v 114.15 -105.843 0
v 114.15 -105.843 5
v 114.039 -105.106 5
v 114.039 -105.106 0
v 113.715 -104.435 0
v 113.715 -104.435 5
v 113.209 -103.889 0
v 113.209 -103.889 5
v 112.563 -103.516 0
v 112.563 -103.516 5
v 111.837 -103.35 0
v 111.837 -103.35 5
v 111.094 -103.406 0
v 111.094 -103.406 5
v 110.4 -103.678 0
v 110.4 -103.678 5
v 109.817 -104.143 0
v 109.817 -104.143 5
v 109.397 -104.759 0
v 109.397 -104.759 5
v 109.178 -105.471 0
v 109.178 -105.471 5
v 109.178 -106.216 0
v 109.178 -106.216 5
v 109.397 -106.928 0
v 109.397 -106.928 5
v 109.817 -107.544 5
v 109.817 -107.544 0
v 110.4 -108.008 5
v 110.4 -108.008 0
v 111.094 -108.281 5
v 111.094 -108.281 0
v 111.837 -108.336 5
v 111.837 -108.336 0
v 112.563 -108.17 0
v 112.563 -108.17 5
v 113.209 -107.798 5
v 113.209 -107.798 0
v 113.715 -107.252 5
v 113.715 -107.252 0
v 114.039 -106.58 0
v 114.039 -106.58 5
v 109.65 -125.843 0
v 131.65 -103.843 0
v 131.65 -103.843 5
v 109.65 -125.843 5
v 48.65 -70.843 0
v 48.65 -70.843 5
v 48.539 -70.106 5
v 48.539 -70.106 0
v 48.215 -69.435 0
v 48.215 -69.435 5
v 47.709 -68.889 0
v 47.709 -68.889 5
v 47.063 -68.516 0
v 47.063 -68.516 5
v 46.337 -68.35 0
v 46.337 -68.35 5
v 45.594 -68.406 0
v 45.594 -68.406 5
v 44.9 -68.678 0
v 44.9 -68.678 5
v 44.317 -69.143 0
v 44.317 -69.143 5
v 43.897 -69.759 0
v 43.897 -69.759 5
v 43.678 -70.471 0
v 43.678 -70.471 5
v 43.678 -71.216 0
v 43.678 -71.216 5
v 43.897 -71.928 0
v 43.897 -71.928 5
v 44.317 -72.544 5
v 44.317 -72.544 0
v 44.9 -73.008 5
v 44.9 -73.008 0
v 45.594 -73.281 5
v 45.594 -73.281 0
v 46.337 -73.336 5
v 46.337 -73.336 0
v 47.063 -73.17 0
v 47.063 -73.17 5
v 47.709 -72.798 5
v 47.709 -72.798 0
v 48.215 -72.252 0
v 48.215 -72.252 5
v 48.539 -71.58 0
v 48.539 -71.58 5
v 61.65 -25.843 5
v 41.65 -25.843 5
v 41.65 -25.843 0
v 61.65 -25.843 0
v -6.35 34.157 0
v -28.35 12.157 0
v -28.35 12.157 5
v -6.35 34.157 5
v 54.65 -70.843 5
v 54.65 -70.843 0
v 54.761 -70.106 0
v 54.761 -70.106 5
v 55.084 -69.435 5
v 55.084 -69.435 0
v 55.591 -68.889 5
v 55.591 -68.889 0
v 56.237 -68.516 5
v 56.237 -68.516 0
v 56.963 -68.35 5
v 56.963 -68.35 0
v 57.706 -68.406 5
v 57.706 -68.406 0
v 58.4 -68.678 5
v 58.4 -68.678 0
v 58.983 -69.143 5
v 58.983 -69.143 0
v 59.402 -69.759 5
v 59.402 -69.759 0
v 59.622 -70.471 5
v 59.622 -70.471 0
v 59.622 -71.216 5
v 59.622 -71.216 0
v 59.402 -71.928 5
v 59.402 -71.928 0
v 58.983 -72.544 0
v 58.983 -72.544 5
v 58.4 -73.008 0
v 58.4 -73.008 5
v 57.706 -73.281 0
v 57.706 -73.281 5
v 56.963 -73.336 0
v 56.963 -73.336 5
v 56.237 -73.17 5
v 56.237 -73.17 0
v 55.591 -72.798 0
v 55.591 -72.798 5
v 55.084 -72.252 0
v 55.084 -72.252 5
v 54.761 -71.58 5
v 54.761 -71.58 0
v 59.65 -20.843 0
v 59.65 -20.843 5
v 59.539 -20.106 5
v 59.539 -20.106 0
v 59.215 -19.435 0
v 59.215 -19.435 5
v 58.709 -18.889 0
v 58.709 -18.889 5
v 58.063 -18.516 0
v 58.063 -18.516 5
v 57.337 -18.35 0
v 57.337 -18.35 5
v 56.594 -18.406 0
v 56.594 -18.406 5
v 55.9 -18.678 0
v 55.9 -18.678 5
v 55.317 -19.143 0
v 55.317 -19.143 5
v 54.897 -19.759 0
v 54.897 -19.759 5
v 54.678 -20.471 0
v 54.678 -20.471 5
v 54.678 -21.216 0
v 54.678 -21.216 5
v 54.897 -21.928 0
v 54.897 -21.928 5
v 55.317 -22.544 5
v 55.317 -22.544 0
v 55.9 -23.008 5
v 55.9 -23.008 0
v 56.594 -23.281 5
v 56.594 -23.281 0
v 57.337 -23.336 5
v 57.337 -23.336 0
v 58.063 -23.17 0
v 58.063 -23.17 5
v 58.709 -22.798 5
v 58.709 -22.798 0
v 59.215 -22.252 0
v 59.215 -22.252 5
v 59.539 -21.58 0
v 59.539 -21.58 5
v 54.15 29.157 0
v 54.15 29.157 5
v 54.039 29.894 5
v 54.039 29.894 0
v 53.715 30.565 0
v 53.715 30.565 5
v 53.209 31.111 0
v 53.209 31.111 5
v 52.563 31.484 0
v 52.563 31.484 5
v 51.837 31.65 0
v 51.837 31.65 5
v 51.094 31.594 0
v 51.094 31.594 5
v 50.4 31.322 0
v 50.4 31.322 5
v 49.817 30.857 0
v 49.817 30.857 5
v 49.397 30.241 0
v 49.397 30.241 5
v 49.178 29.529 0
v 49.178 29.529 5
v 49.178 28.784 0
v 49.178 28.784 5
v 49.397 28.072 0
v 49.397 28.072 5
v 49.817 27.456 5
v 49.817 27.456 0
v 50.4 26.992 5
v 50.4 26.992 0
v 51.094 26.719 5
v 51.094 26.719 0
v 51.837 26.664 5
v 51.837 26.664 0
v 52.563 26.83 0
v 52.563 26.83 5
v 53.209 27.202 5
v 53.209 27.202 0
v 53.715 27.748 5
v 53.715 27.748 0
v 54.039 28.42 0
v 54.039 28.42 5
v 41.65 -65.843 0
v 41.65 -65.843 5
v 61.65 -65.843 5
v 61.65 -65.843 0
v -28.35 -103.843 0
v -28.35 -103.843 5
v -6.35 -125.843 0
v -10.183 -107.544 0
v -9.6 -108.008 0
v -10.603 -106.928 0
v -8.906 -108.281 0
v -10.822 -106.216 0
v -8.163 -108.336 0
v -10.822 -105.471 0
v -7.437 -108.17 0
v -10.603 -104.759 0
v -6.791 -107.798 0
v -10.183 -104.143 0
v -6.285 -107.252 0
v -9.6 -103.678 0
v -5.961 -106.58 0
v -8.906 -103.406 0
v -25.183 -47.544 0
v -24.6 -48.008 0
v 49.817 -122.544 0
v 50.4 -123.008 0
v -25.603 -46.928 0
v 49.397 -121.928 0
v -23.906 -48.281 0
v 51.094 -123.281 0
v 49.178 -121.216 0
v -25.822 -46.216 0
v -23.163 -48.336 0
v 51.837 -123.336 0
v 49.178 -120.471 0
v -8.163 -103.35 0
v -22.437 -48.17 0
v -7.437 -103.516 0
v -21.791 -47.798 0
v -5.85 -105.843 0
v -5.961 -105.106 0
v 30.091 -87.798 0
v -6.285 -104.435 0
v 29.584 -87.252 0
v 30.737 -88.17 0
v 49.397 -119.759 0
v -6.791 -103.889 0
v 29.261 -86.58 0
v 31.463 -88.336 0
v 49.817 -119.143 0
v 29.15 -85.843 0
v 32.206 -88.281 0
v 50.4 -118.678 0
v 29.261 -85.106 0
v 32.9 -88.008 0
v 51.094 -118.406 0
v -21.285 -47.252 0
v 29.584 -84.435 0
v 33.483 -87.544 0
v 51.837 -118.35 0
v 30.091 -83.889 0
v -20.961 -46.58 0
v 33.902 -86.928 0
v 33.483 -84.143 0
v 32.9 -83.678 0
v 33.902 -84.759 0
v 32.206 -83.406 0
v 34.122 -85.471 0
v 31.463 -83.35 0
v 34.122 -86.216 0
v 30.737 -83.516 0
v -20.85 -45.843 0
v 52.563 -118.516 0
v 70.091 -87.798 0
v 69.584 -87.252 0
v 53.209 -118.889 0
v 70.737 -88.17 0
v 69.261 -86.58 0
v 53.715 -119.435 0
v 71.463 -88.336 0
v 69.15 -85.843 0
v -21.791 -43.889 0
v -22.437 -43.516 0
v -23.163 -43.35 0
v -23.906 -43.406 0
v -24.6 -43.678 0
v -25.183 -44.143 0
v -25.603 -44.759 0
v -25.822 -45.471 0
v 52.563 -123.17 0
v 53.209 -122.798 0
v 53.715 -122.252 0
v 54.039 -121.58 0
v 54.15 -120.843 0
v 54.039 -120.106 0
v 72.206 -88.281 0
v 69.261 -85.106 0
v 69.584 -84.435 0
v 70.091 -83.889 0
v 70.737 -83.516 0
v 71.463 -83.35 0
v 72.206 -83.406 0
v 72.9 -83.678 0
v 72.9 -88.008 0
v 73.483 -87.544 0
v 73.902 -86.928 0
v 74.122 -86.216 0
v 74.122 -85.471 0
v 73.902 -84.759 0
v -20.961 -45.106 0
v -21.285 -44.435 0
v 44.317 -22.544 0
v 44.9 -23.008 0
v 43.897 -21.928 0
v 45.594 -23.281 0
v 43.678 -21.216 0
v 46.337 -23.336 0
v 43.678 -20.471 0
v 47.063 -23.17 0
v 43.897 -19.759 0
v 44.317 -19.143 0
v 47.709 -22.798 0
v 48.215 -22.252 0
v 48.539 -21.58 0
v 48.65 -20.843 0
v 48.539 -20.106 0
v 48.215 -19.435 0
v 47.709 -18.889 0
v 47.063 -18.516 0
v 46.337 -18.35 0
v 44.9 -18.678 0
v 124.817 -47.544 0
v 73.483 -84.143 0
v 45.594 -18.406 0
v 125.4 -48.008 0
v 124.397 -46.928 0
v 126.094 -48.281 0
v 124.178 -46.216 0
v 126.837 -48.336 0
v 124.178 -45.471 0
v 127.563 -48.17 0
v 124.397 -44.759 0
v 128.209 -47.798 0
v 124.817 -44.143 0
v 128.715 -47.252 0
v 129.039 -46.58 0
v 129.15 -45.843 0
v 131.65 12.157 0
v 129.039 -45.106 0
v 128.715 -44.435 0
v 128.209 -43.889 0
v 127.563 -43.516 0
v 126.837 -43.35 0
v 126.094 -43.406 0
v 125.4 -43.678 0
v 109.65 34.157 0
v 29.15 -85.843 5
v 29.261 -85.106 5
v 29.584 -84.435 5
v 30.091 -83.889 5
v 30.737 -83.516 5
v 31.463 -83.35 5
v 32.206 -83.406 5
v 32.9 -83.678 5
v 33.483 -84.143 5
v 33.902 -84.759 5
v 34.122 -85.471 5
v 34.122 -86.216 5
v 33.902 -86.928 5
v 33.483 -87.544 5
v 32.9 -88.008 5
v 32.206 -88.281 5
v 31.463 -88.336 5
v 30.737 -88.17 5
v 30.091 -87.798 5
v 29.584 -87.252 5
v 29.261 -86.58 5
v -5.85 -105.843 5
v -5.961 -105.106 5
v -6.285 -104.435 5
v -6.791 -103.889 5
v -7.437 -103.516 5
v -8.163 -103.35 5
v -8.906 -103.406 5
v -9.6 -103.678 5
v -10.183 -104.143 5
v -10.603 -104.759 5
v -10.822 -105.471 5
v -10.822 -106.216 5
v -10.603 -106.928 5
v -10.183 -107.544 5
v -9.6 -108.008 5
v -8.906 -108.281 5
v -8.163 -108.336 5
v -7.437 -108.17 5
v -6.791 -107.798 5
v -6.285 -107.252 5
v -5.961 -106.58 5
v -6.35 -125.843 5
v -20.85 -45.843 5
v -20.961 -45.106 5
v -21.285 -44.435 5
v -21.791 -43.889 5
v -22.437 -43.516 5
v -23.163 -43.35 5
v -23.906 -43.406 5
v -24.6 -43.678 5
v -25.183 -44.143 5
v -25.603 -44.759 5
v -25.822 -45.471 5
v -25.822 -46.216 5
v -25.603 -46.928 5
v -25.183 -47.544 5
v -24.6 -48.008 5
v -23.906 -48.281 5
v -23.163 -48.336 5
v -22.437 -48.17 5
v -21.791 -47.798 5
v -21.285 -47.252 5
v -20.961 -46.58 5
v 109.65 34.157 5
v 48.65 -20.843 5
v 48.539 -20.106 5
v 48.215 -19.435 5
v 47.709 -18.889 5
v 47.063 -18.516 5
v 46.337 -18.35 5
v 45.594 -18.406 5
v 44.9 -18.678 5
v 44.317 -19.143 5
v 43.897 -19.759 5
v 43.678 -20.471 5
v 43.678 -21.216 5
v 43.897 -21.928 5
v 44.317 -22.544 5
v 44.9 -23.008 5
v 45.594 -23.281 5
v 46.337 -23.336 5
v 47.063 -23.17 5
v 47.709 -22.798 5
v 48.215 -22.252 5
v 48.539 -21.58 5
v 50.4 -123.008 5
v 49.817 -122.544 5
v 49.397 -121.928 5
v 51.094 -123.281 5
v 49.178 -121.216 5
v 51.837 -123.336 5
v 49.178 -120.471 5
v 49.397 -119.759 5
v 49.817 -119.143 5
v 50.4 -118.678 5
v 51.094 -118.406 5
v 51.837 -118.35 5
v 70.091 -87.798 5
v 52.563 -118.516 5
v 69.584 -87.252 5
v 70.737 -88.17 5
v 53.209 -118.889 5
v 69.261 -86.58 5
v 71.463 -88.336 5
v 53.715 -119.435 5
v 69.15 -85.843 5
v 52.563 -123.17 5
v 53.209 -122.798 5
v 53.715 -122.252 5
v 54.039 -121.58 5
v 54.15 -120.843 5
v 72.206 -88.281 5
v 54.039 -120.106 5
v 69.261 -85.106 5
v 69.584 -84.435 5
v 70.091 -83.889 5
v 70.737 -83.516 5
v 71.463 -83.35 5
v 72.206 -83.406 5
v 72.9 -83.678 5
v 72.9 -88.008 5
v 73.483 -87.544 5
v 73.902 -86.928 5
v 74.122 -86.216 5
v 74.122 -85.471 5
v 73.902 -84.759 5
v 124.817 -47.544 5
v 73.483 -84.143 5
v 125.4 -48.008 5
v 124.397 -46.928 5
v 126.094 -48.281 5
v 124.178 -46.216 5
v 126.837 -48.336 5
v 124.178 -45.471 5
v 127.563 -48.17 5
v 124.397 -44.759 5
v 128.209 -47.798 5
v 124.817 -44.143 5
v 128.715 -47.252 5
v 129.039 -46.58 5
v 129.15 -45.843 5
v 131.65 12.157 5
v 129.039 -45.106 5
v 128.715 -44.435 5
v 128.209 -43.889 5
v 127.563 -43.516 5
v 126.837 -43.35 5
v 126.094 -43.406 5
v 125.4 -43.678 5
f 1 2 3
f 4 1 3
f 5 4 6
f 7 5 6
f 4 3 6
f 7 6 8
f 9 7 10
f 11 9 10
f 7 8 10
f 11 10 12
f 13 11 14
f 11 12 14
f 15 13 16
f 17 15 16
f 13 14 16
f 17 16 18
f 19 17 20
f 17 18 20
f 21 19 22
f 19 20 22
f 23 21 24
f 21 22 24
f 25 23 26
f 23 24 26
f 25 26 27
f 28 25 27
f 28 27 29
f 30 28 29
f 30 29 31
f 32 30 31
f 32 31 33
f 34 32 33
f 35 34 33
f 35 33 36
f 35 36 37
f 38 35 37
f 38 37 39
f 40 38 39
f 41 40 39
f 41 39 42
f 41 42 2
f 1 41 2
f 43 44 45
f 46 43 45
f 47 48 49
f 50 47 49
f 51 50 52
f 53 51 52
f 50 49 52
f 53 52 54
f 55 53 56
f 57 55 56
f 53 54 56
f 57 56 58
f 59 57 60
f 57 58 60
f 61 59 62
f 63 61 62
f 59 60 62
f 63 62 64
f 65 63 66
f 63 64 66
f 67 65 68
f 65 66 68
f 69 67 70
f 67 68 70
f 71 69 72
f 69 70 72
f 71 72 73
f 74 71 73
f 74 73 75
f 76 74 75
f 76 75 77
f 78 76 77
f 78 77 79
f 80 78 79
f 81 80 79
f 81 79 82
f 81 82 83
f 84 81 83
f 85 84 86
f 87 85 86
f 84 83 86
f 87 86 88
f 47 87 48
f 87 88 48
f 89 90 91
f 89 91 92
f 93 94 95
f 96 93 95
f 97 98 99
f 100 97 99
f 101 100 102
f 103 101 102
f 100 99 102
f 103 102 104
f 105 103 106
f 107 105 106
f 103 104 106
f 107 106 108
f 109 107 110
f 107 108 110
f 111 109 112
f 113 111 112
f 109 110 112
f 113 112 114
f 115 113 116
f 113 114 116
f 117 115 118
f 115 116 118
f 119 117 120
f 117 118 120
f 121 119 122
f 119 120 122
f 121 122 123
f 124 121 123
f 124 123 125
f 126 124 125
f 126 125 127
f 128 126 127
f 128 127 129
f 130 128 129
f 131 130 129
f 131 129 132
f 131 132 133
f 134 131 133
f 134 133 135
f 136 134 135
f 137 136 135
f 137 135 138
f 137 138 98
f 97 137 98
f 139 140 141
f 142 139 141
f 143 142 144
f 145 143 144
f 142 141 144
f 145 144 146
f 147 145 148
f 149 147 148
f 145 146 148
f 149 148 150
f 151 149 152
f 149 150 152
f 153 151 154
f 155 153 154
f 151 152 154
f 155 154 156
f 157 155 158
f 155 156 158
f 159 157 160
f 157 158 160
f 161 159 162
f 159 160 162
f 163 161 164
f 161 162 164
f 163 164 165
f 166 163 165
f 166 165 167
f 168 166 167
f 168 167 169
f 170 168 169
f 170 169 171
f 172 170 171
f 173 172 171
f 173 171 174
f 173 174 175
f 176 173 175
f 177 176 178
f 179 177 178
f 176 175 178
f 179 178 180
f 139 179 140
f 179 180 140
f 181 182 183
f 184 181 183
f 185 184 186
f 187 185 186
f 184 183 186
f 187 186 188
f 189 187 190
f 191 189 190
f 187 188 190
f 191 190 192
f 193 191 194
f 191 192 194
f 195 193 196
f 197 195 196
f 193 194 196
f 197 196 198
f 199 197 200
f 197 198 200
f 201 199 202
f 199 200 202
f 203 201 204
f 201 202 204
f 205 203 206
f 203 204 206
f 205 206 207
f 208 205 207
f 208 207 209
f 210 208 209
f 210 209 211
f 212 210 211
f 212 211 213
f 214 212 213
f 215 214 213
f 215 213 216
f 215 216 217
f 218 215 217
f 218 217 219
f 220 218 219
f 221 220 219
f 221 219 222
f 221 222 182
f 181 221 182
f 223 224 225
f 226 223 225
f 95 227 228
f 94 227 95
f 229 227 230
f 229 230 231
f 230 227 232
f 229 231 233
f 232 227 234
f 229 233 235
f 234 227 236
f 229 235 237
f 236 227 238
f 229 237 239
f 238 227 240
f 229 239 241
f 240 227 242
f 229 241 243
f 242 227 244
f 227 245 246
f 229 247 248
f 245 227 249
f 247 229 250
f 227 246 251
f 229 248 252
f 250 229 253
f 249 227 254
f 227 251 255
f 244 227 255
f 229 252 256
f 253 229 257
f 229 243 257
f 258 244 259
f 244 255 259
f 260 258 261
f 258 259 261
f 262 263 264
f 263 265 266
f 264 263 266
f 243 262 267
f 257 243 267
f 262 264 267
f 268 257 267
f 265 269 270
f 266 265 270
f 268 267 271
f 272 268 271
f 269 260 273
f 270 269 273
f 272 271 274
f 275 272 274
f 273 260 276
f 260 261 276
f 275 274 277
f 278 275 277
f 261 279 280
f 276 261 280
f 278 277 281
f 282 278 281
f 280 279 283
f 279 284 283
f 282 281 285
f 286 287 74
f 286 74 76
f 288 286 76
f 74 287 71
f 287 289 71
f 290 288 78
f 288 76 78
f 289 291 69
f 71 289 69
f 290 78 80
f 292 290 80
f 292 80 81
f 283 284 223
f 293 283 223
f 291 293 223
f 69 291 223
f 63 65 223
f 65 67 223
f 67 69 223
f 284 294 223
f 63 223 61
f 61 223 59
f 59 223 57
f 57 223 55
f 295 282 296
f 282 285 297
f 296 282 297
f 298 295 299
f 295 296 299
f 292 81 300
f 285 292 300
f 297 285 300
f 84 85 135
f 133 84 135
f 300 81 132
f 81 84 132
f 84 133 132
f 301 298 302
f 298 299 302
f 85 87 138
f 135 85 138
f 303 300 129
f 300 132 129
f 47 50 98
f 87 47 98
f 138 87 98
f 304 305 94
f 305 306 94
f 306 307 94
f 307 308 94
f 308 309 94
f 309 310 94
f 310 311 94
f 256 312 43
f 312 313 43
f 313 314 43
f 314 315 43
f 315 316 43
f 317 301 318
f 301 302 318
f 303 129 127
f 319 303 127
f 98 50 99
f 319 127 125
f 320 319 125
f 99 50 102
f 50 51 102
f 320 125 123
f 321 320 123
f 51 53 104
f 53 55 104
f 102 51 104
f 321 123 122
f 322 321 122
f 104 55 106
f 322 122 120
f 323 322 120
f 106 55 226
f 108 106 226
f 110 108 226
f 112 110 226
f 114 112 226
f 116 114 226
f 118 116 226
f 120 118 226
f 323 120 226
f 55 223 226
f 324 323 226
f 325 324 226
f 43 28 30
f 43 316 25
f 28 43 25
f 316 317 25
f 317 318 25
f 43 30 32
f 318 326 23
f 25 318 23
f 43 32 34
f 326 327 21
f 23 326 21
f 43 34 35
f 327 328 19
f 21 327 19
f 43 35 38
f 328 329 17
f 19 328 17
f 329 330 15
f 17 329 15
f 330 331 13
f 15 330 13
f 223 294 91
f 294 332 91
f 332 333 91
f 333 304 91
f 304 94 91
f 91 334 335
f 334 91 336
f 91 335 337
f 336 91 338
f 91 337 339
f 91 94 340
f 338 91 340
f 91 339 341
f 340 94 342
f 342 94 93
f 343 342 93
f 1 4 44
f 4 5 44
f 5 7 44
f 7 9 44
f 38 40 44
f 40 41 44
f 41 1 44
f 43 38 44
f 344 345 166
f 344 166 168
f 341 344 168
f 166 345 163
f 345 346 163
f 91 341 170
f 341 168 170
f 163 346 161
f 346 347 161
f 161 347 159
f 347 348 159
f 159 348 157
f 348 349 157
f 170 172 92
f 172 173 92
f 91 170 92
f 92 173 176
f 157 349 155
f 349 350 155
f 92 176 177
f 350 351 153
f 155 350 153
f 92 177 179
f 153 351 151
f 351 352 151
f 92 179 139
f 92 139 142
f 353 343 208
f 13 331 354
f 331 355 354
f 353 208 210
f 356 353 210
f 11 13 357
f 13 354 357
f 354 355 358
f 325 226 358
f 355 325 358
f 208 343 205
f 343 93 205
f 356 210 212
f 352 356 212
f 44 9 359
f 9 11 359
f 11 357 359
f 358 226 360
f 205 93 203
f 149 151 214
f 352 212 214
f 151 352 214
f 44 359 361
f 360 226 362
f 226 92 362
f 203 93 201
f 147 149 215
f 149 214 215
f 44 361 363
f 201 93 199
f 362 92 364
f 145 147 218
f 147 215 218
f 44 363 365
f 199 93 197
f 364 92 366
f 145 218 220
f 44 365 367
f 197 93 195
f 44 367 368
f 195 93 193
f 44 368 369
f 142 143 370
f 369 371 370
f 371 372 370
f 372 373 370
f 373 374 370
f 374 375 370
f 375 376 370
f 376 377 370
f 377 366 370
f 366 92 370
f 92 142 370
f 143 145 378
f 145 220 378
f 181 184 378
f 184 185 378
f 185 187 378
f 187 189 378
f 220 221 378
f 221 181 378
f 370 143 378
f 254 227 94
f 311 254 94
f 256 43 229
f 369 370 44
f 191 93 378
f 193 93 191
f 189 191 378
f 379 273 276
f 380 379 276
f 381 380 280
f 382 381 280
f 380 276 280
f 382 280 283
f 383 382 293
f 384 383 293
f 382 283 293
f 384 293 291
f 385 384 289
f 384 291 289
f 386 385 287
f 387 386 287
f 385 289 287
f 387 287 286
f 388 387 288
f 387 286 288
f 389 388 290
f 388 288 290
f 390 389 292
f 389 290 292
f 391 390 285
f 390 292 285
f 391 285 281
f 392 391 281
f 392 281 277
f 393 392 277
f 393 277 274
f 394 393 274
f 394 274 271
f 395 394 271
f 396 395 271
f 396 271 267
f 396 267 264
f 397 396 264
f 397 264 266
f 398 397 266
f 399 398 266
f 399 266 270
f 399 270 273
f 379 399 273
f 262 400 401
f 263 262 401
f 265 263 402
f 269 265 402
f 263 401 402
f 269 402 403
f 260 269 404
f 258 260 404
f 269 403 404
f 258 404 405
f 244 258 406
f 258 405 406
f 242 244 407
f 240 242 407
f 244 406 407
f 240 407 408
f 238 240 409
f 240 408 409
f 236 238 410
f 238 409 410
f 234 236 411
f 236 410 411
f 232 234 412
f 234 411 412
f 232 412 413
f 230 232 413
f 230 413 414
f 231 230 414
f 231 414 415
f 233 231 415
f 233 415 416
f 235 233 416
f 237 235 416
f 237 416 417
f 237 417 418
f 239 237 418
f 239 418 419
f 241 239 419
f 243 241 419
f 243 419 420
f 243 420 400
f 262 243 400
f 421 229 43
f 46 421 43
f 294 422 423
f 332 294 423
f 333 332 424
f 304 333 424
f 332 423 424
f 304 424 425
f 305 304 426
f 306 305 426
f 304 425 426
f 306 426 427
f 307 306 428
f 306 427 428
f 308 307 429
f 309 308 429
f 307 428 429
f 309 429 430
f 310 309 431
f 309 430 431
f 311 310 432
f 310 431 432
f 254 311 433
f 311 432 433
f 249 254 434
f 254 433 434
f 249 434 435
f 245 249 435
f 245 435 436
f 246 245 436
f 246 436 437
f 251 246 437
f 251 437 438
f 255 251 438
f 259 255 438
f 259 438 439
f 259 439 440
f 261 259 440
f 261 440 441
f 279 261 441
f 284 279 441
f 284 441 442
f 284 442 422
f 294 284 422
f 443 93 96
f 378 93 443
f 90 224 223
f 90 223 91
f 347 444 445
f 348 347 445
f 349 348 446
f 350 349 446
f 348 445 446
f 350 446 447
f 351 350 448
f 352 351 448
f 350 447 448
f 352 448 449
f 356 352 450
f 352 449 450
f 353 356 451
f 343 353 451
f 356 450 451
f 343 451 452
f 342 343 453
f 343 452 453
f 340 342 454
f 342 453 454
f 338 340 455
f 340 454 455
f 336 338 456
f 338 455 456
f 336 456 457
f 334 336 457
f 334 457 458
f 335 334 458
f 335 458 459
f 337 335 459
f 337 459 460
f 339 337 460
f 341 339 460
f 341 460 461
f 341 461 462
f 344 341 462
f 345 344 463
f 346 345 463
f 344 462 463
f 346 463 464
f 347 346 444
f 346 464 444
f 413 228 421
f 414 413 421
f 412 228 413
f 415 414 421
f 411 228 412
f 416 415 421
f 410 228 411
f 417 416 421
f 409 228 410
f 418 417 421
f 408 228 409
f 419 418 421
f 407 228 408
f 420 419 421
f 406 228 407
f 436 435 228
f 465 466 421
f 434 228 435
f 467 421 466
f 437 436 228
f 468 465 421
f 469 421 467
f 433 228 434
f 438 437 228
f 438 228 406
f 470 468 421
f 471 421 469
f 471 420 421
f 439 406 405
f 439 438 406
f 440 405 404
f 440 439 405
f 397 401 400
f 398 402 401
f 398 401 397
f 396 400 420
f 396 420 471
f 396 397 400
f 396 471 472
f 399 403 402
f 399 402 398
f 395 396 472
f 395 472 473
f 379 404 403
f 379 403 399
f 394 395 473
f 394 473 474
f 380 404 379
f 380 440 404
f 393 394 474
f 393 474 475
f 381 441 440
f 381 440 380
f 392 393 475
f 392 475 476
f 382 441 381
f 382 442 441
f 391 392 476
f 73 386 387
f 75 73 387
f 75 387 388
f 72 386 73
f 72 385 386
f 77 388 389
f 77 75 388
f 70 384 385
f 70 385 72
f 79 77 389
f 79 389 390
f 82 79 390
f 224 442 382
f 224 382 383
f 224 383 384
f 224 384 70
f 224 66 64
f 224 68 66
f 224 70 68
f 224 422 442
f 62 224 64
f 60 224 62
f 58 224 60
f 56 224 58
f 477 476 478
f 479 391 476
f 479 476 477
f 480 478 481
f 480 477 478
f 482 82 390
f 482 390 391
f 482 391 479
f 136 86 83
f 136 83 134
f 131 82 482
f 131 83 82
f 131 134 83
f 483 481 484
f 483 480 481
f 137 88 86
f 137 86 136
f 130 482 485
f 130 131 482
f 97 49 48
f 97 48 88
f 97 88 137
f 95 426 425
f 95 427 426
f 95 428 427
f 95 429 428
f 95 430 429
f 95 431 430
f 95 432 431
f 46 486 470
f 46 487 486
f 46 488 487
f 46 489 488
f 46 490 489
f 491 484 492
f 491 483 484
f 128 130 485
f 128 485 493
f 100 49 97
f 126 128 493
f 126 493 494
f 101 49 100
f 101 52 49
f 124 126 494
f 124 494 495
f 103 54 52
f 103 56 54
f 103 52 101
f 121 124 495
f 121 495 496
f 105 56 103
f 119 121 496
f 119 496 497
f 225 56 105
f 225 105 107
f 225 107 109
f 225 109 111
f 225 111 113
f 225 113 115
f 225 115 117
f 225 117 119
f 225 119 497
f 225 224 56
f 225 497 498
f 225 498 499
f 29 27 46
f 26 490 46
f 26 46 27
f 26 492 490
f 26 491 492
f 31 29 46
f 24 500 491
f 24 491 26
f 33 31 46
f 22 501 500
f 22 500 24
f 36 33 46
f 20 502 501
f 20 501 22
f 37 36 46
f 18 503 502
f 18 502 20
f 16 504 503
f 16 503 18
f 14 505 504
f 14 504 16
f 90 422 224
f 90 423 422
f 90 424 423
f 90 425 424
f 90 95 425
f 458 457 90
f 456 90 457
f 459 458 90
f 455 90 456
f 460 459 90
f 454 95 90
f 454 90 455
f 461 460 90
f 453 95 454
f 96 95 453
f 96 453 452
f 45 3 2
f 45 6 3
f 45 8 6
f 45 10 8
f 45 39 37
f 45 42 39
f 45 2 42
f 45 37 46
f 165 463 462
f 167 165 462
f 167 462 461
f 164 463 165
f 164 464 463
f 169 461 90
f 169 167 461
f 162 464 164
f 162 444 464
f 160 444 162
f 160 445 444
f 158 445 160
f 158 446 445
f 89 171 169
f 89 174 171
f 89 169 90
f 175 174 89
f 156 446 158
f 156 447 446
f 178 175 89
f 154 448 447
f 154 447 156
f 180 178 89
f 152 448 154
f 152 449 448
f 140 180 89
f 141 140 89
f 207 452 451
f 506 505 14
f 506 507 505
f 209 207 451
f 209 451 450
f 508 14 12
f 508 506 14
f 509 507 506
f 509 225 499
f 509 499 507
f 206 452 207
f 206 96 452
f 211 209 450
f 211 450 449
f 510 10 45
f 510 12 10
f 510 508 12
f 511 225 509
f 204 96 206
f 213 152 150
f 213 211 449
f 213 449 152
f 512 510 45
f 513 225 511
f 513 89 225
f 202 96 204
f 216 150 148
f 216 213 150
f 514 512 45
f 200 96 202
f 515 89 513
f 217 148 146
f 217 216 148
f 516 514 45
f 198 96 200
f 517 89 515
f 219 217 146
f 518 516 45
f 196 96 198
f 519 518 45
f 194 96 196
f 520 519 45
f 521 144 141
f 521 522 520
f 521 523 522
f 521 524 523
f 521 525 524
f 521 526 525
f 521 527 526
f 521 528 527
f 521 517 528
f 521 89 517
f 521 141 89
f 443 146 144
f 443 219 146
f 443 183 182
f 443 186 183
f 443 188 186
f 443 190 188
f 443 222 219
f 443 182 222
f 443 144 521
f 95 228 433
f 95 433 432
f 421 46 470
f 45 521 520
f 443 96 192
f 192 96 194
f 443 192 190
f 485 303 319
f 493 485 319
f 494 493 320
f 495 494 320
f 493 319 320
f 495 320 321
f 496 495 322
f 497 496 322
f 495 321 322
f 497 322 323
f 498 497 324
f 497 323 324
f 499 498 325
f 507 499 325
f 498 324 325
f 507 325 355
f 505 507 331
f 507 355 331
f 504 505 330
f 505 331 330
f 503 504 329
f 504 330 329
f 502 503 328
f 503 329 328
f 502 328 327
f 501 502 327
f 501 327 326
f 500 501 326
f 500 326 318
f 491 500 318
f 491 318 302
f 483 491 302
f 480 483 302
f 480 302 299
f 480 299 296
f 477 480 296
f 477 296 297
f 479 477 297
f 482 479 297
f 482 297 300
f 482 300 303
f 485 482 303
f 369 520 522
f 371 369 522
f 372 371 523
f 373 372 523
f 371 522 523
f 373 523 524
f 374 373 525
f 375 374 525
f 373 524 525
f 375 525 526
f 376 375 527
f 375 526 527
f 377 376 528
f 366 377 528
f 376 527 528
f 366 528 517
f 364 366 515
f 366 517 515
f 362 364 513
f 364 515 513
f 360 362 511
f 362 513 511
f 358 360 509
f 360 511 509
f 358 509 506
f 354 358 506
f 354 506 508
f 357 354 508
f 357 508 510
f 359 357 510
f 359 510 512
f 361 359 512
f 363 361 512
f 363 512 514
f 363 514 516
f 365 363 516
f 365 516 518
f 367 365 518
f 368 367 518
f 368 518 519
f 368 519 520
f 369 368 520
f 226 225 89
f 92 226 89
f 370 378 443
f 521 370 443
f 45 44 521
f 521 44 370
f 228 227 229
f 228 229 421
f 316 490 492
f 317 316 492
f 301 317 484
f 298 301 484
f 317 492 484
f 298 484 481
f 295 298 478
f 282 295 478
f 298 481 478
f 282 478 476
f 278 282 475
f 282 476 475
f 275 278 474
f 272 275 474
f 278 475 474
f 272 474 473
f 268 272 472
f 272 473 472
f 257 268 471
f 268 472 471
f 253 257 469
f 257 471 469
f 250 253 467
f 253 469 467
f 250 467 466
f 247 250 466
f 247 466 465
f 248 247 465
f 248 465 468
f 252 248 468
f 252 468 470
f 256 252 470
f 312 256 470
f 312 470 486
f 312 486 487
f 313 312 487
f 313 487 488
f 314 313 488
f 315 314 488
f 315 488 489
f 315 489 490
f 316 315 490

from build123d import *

# Parameters (mm, degrees)
ESQUISSE1_W             = 160
ESQUISSE1_H             = 160
BOSS_EXTRU_1_DEPTH      = 5
CHANFREIN1_SIZE         = 22
ESQUISSE2_W             = 20
ESQUISSE2_H             = 40
ENL_V_MAT_EXTRU_1_DEPTH = 5
ESQUISSE3_R             = 2.5
ENL_V_MAT_EXTRU_2_DEPTH = 5
ESQUISSE4_R             = 2.5
ENL_V_MAT_EXTRU_3_DEPTH = 5
ESQUISSE5_R             = 2.5
ENL_V_MAT_EXTRU_4_DEPTH = 10
ESQUISSE6_R             = 2.5
ENL_V_MAT_EXTRU_5_DEPTH = 10
ESQUISSE7_R             = 2.5
ENL_V_MAT_EXTRU_6_DEPTH = 10
ESQUISSE8_R             = 2.5
ENL_V_MAT_EXTRU_7_DEPTH = 10
ESQUISSE9_R             = 2.5
ENL_V_MAT_EXTRU_8_DEPTH = 30
ESQUISSE10_R            = 2.5
ENL_V_MAT_EXTRU_9_DEPTH = 30


with BuildPart() as part:
    # Esquisse1 → Boss.-Extru.1 (new body)
    with BuildSketch(Plane.XY):
        with Locations((51.649882403, -45.84323181)):
            Rectangle(ESQUISSE1_W, ESQUISSE1_H)
    extrude(amount=BOSS_EXTRU_1_DEPTH)

    # Chanfrein1
    chanfrein1_edges = [part.edges().sort_by_distance(p)[0] for p in [
        (-28.350117597, 34.15676819, 2.5),
        (131.649882403, 34.15676819, 2.5),
        (131.649882403, -125.84323181, 2.5),
        (-28.350117597, -125.84323181, 2.5),
    ]]
    chamfer(chanfrein1_edges, length=CHANFREIN1_SIZE)

    # Esquisse2 → Enlèv. mat.-Extru.1 (cut)
    with BuildSketch(Plane.XY.offset(5)):
        with Locations((51.649882403, -45.84323181)):
            Rectangle(ESQUISSE2_W, ESQUISSE2_H)
    extrude(amount=-ENL_V_MAT_EXTRU_1_DEPTH, mode=Mode.SUBTRACT)

    # Esquisse3 → Enlèv. mat.-Extru.2 (cut)
    with BuildSketch(Plane.XY.offset(5)):
        with Locations((46.149882403, -20.84323181)):
            Circle(ESQUISSE3_R)
        with Locations((57.149882403, -20.84323181)):
            Circle(ESQUISSE3_R)
    extrude(amount=-ENL_V_MAT_EXTRU_2_DEPTH, mode=Mode.SUBTRACT)

    # Esquisse4 → Enlèv. mat.-Extru.3 (cut)
    with BuildSketch(Plane.XY.offset(5)):
        with Locations((46.149882403, -70.84323181)):
            Circle(ESQUISSE4_R)
        with Locations((57.149882403, -61.84323181)):
            Circle(ESQUISSE4_R)
    extrude(amount=-ENL_V_MAT_EXTRU_3_DEPTH, mode=Mode.SUBTRACT)

    # Esquisse5 → Enlèv. mat.-Extru.4 (cut)
    with BuildSketch(Plane(origin=(0, 0, 0), x_dir=(-1, 0, 0), z_dir=(0, 0, -1))):
        with Locations((-57.149882403, -70.84323181)):
            Circle(ESQUISSE5_R)
    extrude(amount=-ENL_V_MAT_EXTRU_4_DEPTH, mode=Mode.SUBTRACT)

    # Esquisse6 → Enlèv. mat.-Extru.5 (cut)
    with BuildSketch(Plane.XY.offset(5)):
        with Locations((51.649882403, 29.15676819)):
            Circle(ESQUISSE6_R)
    extrude(amount=-ENL_V_MAT_EXTRU_5_DEPTH, mode=Mode.SUBTRACT)

    # Esquisse7 → Enlèv. mat.-Extru.6 (cut)
    with BuildSketch(Plane.XY.offset(5)):
        with Locations((-23.350117597, -45.84323181)):
            Circle(ESQUISSE7_R)
    extrude(amount=-ENL_V_MAT_EXTRU_6_DEPTH, mode=Mode.SUBTRACT)

    # Esquisse8 → Enlèv. mat.-Extru.7 (cut)
    with BuildSketch(Plane.XY.offset(5)):
        with Locations((51.649882403, -120.84323181)):
            Circle(ESQUISSE8_R)
        with Locations((126.649882403, -45.84323181)):
            Circle(ESQUISSE8_R)
    extrude(amount=-ENL_V_MAT_EXTRU_7_DEPTH, mode=Mode.SUBTRACT)

    # Esquisse9 → Enlèv. mat.-Extru.8 (cut)
    with BuildSketch(Plane.XY.offset(5)):
        with Locations((111.649882403, -105.84323181)):
            Circle(ESQUISSE9_R)
        with Locations((-8.350117597, -105.84323181)):
            Circle(ESQUISSE9_R)
    extrude(amount=-ENL_V_MAT_EXTRU_8_DEPTH, mode=Mode.SUBTRACT)

    # Esquisse10 → Enlèv. mat.-Extru.9 (cut)
    with BuildSketch(Plane(origin=(0, 0, 0), x_dir=(-1, 0, 0), z_dir=(0, 0, -1))):
        with Locations((-71.649882403, -85.84323181)):
            Circle(ESQUISSE10_R)
        with Locations((-31.649882403, -85.84323181)):
            Circle(ESQUISSE10_R)
    extrude(amount=-ENL_V_MAT_EXTRU_9_DEPTH, mode=Mode.SUBTRACT)


solid = part.part
